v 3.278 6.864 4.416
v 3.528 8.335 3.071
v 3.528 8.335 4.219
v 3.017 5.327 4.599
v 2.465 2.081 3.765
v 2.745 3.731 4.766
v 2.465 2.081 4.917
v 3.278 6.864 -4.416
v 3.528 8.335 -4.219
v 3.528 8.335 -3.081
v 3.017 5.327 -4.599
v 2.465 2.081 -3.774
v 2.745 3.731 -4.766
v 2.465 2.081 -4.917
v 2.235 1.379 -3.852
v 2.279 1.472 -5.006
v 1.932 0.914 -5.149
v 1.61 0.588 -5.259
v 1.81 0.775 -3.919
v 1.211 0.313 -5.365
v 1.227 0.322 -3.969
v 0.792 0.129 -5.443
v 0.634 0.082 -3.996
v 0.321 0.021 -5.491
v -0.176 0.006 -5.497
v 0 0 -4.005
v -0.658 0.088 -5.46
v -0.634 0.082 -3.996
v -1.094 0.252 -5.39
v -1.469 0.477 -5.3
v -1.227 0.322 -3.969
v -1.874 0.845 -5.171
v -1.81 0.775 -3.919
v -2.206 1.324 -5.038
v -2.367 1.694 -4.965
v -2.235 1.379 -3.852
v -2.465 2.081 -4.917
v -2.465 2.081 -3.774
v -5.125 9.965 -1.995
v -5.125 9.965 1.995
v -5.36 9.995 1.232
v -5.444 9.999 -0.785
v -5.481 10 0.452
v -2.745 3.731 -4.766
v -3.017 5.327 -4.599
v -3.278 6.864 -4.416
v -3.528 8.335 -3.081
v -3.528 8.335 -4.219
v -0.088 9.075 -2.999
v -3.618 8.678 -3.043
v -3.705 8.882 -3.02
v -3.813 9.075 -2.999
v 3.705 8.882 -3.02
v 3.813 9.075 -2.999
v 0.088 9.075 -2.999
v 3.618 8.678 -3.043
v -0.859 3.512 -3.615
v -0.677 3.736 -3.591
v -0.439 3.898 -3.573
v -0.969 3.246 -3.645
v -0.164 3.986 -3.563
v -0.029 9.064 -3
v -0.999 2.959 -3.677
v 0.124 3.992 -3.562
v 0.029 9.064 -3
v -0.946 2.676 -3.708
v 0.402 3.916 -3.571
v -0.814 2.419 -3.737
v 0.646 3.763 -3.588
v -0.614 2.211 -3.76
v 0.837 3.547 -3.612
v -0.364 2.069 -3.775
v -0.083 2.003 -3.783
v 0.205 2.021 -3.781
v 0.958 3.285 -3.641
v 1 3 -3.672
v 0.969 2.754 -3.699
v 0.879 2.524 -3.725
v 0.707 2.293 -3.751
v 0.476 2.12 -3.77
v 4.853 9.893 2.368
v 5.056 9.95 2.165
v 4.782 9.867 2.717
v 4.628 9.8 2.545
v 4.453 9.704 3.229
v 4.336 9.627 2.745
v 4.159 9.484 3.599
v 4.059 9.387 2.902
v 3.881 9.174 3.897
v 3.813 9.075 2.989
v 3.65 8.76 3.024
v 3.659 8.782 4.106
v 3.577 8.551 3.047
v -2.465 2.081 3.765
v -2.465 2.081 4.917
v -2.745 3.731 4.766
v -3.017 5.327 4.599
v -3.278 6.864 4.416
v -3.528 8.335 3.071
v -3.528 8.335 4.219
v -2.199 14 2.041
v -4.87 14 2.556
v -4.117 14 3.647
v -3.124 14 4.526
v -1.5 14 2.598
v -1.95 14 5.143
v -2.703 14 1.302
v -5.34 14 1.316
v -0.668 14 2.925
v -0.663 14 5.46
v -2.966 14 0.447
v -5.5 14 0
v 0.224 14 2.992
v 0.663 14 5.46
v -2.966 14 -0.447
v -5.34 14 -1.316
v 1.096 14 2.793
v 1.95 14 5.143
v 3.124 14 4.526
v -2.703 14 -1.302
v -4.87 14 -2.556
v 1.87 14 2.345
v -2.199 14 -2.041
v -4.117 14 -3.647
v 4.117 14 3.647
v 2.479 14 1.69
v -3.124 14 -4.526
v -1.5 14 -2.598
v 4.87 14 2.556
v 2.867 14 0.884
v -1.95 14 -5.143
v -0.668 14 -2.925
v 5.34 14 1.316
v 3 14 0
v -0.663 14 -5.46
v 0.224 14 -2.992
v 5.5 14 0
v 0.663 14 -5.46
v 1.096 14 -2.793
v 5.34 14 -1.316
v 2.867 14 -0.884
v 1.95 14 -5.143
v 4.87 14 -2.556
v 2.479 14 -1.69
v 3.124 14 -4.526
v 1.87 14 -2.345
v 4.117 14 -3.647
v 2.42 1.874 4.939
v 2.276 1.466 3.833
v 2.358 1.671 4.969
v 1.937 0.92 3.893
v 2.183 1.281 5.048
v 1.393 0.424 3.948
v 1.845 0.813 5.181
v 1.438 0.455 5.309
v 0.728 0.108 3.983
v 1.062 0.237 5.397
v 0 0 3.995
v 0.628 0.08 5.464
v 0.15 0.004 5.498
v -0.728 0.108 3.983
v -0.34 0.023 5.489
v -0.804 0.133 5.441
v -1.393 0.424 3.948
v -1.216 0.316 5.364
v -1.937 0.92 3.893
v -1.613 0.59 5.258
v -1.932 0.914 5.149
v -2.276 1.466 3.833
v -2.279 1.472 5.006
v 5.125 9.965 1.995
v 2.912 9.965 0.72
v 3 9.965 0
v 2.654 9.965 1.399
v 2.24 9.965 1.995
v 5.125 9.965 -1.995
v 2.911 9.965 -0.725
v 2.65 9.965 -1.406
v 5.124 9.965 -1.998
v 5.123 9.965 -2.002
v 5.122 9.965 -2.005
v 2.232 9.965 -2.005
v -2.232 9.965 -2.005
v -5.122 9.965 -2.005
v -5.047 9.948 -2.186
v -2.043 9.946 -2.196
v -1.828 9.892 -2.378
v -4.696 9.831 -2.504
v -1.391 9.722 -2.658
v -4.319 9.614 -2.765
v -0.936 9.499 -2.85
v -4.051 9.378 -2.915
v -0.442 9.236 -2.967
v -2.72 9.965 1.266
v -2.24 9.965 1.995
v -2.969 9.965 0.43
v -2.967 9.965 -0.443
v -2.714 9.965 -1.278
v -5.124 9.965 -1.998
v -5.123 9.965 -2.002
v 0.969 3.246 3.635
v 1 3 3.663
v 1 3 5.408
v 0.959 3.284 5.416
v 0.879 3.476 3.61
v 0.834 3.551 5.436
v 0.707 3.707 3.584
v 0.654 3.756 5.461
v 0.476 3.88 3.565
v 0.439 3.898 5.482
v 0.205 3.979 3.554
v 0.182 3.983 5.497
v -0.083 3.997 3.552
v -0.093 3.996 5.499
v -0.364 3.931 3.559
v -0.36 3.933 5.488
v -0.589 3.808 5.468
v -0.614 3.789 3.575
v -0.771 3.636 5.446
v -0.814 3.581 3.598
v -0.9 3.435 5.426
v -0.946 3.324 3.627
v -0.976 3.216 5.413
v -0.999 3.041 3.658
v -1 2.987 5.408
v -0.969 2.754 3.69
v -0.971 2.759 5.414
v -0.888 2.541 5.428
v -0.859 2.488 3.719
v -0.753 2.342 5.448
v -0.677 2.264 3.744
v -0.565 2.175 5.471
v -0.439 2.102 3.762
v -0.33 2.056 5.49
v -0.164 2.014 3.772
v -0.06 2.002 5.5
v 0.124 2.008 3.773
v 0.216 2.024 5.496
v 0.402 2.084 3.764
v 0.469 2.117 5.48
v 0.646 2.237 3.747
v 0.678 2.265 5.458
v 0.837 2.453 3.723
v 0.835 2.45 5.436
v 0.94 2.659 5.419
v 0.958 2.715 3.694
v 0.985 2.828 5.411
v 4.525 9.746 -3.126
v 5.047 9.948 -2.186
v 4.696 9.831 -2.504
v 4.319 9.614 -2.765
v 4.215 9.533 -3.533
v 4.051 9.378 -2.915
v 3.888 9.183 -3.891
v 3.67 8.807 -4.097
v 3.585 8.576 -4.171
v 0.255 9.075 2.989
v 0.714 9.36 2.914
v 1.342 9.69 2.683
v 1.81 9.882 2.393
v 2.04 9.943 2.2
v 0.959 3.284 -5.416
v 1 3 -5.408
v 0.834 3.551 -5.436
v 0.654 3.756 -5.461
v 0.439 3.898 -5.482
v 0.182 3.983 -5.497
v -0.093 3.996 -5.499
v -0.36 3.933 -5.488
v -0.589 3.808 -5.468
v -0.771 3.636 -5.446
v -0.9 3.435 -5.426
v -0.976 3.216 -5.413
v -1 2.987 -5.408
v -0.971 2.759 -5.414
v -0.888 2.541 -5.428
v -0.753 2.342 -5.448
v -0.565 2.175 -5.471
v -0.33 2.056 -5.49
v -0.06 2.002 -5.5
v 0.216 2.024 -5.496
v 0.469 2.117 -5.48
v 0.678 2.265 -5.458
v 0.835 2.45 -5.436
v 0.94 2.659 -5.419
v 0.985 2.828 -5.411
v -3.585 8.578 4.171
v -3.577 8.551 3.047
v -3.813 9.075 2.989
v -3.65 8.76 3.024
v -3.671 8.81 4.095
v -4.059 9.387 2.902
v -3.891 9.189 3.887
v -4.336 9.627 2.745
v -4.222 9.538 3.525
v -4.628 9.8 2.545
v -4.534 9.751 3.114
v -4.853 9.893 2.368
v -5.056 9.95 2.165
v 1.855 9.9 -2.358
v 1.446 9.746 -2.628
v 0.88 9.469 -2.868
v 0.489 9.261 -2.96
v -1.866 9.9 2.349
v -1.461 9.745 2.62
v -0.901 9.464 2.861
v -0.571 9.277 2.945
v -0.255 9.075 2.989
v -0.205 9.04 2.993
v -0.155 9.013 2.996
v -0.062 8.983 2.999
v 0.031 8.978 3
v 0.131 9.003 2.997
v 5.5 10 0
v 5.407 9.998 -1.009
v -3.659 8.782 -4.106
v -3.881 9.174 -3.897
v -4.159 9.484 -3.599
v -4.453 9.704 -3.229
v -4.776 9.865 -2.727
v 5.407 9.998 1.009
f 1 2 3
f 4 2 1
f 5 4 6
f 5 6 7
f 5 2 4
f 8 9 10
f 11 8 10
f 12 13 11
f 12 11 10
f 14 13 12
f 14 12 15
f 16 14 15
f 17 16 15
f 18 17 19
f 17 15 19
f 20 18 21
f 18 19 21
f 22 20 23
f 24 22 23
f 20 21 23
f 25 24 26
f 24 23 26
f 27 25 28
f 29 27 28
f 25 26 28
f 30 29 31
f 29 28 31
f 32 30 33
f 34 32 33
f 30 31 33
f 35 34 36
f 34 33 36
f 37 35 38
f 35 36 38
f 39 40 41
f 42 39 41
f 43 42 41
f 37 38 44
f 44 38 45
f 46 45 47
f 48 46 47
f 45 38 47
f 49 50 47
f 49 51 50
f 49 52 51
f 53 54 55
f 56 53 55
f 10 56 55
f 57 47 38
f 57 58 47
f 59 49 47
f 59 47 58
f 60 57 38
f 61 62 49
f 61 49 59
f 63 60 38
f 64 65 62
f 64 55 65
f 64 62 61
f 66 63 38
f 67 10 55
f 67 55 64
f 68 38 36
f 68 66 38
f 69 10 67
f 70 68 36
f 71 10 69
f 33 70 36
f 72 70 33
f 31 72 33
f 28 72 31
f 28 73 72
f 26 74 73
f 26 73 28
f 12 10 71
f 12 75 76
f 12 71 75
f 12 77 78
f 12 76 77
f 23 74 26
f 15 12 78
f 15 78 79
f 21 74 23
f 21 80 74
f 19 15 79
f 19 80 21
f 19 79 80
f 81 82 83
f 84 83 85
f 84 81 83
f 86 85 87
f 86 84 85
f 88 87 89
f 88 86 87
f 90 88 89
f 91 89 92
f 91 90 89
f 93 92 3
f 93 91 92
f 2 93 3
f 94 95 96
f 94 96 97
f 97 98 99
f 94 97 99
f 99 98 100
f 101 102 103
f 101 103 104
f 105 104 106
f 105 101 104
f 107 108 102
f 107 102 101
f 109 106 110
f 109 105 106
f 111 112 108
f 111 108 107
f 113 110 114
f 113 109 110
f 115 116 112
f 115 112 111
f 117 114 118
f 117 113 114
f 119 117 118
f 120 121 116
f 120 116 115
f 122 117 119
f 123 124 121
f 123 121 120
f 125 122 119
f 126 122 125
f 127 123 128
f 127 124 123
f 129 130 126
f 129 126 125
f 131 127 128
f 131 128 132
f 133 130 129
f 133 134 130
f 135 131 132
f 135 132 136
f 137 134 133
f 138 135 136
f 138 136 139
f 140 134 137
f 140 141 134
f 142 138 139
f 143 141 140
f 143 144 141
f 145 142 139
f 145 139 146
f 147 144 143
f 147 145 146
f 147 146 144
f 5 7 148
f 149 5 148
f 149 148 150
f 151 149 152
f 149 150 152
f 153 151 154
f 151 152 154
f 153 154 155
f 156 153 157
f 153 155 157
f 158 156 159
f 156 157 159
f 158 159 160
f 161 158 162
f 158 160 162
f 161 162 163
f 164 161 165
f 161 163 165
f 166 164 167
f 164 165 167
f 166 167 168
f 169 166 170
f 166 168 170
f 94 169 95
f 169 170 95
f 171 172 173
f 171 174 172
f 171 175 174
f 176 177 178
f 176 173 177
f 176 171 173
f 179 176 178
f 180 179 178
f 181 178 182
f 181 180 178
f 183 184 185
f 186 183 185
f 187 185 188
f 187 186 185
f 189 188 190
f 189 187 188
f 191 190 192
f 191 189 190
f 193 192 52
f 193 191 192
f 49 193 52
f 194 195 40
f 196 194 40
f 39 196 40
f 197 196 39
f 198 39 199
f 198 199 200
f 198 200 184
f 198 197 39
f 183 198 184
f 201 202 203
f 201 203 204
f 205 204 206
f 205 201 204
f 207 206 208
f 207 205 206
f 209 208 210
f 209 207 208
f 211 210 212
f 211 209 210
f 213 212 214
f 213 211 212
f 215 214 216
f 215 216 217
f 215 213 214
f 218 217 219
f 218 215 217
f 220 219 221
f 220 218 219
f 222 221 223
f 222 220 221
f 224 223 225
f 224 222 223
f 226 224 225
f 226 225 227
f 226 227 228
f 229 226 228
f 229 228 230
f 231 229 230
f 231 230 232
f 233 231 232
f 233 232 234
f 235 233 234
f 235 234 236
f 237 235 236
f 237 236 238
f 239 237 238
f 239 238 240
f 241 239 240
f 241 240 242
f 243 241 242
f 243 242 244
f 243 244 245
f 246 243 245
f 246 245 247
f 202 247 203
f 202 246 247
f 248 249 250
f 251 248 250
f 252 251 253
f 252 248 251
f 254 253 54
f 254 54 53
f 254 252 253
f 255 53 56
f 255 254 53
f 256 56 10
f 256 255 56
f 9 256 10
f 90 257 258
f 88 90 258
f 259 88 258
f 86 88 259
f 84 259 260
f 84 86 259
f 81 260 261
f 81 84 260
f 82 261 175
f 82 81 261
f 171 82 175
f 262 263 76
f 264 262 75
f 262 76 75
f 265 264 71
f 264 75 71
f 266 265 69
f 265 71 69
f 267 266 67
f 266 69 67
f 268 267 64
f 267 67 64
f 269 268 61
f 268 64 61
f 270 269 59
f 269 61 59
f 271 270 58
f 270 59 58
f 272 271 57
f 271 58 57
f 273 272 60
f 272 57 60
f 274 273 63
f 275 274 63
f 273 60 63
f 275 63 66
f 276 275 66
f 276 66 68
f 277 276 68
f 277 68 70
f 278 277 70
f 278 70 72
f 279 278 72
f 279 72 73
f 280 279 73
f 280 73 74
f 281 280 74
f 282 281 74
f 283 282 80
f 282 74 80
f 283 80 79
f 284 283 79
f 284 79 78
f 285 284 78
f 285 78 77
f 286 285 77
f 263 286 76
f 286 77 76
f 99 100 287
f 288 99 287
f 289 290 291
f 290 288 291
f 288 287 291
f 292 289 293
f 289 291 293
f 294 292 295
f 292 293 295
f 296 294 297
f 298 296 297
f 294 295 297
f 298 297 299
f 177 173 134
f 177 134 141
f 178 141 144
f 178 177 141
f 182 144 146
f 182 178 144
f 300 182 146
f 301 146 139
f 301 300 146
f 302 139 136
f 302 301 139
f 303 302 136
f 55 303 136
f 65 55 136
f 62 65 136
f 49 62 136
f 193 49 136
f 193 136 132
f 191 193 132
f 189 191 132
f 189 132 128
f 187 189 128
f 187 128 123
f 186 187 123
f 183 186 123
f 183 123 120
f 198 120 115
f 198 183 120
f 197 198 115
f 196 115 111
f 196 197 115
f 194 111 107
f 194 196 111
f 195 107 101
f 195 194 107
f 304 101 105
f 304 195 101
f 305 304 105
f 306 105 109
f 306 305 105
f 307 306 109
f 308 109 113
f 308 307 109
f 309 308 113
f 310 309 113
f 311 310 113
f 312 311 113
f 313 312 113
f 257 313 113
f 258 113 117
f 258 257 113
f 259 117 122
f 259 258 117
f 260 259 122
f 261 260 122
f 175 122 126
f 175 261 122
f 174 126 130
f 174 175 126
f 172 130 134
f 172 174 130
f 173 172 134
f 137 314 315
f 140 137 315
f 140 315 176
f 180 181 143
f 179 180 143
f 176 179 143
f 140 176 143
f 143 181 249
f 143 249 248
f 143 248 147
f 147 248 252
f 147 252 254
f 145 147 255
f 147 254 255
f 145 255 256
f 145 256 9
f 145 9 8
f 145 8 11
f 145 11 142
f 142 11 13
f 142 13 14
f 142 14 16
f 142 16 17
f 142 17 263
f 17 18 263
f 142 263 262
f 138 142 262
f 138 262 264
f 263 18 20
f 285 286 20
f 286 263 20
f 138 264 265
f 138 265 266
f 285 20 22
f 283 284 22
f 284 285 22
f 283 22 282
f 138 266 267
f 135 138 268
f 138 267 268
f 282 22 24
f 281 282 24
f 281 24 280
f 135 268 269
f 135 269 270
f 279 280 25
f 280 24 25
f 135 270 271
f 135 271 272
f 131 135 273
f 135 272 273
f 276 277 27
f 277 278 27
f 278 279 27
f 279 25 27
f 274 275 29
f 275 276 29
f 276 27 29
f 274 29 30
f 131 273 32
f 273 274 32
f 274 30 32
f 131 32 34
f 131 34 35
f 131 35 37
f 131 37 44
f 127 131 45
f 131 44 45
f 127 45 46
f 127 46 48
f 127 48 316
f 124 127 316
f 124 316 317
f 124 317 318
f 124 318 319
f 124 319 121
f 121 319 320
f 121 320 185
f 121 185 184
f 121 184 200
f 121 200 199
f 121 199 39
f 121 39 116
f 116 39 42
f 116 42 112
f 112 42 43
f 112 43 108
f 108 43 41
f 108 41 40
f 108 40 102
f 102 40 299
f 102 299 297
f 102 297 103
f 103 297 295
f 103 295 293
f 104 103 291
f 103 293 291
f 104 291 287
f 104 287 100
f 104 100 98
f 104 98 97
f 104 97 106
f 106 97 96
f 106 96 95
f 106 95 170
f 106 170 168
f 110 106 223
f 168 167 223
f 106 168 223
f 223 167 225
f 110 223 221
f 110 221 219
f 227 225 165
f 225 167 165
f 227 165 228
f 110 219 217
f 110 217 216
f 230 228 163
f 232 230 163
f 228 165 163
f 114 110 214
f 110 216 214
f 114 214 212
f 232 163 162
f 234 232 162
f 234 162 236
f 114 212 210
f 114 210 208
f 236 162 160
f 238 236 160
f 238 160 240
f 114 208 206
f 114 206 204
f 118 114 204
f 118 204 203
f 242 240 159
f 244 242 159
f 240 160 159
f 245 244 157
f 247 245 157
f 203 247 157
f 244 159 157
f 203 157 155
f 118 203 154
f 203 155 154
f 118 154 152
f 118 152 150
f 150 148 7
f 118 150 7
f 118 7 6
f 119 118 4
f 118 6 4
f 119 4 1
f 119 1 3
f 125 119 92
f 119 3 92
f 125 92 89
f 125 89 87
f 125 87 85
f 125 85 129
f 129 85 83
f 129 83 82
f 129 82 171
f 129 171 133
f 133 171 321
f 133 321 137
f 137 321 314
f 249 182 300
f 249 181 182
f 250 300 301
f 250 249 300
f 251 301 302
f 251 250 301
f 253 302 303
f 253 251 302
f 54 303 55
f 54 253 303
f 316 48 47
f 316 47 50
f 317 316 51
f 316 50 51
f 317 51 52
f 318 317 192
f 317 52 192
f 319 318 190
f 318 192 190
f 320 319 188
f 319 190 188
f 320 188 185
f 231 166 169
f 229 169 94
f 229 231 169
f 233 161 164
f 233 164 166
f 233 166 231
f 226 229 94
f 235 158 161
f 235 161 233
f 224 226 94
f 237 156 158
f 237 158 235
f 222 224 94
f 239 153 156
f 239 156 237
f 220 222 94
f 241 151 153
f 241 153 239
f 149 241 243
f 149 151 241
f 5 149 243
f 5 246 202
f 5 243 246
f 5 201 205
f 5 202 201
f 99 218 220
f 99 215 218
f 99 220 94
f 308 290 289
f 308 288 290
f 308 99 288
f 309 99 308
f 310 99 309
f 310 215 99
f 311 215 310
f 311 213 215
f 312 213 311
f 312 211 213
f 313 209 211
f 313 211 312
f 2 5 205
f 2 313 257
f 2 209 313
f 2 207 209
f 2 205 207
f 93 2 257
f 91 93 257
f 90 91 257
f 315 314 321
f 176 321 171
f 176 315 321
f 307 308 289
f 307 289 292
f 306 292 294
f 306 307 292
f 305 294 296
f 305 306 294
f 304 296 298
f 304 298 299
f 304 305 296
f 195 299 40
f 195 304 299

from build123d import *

# Parameters (mm, degrees)
SKETCH1_R               = 5.5
BOSS_EXTRUDE1_DEPTH     = 14
CUT_EXTRUDE3_DEPTH      = 6.5
CUT_EXTRUDE3_DEPTH_BACK = 6.5
CUT_EXTRUDE4_DEPTH      = 6.5000001
CUT_EXTRUDE4_DEPTH_BACK = 6.5000001
SKETCH5_R               = 3
CUT_EXTRUDE7_DEPTH      = 15.0000001
CUT_EXTRUDE7_DEPTH_BACK = 14
SKETCH6_R               = 1
CUT_EXTRUDE8_DEPTH      = 6.5000001
CUT_EXTRUDE8_DEPTH_BACK = 6.5000001


with BuildPart() as part:
    # Sketch1 → Boss-Extrude1 (new body)
    with BuildSketch(Plane(origin=(0, 0, 0), x_dir=(1, 0, 0), z_dir=(0, 1, 0))):
        Circle(SKETCH1_R)
    extrude(amount=BOSS_EXTRUDE1_DEPTH)

    # Sketch3 → Cut-Extrude3 (cut, two sides)
    with BuildSketch(Plane.XY) as cut_extrude3_sk:
        with BuildLine():
            Line((45.232137495, 10), (5.5, 10))
            ThreePointArc((5.5, 10), (4.209777241, 9.528177094), (3.528311133, 8.335325231))
            Line((3.528311133, 8.335325231), (2.464611084, 2.080843461))
            ThreePointArc((2.464611084, 2.080843461), (0, 0), (-2.464611084, 2.080843461))
            Line((-2.464611084, 2.080843461), (-3.528311133, 8.335325231))
            ThreePointArc((-3.528311133, 8.335325231), (-4.209777241, 9.528177094), (-5.5, 10))
            Line((-5.5, 10), (-45.232137495, 10))
            Line((-45.232137495, 10), (-45.232137495, -69.464274989))
            Line((-45.232137495, -69.464274989), (45.232137495, -69.464274989))
            Line((45.232137495, -69.464274989), (45.232137495, 10))
        make_face()
    extrude(amount=CUT_EXTRUDE3_DEPTH, mode=Mode.SUBTRACT)
    extrude(cut_extrude3_sk.sketch, amount=-CUT_EXTRUDE3_DEPTH_BACK, mode=Mode.SUBTRACT)

    # Sketch4 → Cut-Extrude4 (cut, two sides)
    with BuildSketch(Plane(origin=(0, 0, 0), x_dir=(0, 0, -1), z_dir=(1, 0, 0))) as cut_extrude4_sk:
        with BuildLine():
            Line((4.004785901, 0), (-3.995214099, 0))
            Line((-3.995214099, 0), (-2.98912449, 9.074785729))
            ThreePointArc((-2.98912449, 9.074785729), (-2.662225586, 9.709641809), (-1.995214099, 9.964594376))
            Line((-1.995214099, 9.964594376), (2.004785901, 9.964594376))
            ThreePointArc((2.004785901, 9.964594376), (2.671797388, 9.709641809), (2.998696292, 9.074785729))
            Line((2.998696292, 9.074785729), (4.004785901, 0))
        make_face()
    extrude(amount=CUT_EXTRUDE4_DEPTH, mode=Mode.SUBTRACT)
    extrude(cut_extrude4_sk.sketch, amount=-CUT_EXTRUDE4_DEPTH_BACK, mode=Mode.SUBTRACT)

    # Sketch5 → Cut-Extrude7 (cut, two sides)
    with BuildSketch(Plane(origin=(0, 0, 0), x_dir=(1, 0, 0), z_dir=(0, 1, 0))) as cut_extrude7_sk:
        Circle(SKETCH5_R)
    extrude(amount=CUT_EXTRUDE7_DEPTH, mode=Mode.SUBTRACT)
    extrude(cut_extrude7_sk.sketch, amount=-CUT_EXTRUDE7_DEPTH_BACK, mode=Mode.SUBTRACT)

    # Sketch6 → Cut-Extrude8 (cut, two sides)
    with BuildSketch(Plane.XY) as cut_extrude8_sk:
        with Locations((0, 3)):
            Circle(SKETCH6_R)
    extrude(amount=CUT_EXTRUDE8_DEPTH, mode=Mode.SUBTRACT)
    extrude(cut_extrude8_sk.sketch, amount=-CUT_EXTRUDE8_DEPTH_BACK, mode=Mode.SUBTRACT)


solid = part.part
